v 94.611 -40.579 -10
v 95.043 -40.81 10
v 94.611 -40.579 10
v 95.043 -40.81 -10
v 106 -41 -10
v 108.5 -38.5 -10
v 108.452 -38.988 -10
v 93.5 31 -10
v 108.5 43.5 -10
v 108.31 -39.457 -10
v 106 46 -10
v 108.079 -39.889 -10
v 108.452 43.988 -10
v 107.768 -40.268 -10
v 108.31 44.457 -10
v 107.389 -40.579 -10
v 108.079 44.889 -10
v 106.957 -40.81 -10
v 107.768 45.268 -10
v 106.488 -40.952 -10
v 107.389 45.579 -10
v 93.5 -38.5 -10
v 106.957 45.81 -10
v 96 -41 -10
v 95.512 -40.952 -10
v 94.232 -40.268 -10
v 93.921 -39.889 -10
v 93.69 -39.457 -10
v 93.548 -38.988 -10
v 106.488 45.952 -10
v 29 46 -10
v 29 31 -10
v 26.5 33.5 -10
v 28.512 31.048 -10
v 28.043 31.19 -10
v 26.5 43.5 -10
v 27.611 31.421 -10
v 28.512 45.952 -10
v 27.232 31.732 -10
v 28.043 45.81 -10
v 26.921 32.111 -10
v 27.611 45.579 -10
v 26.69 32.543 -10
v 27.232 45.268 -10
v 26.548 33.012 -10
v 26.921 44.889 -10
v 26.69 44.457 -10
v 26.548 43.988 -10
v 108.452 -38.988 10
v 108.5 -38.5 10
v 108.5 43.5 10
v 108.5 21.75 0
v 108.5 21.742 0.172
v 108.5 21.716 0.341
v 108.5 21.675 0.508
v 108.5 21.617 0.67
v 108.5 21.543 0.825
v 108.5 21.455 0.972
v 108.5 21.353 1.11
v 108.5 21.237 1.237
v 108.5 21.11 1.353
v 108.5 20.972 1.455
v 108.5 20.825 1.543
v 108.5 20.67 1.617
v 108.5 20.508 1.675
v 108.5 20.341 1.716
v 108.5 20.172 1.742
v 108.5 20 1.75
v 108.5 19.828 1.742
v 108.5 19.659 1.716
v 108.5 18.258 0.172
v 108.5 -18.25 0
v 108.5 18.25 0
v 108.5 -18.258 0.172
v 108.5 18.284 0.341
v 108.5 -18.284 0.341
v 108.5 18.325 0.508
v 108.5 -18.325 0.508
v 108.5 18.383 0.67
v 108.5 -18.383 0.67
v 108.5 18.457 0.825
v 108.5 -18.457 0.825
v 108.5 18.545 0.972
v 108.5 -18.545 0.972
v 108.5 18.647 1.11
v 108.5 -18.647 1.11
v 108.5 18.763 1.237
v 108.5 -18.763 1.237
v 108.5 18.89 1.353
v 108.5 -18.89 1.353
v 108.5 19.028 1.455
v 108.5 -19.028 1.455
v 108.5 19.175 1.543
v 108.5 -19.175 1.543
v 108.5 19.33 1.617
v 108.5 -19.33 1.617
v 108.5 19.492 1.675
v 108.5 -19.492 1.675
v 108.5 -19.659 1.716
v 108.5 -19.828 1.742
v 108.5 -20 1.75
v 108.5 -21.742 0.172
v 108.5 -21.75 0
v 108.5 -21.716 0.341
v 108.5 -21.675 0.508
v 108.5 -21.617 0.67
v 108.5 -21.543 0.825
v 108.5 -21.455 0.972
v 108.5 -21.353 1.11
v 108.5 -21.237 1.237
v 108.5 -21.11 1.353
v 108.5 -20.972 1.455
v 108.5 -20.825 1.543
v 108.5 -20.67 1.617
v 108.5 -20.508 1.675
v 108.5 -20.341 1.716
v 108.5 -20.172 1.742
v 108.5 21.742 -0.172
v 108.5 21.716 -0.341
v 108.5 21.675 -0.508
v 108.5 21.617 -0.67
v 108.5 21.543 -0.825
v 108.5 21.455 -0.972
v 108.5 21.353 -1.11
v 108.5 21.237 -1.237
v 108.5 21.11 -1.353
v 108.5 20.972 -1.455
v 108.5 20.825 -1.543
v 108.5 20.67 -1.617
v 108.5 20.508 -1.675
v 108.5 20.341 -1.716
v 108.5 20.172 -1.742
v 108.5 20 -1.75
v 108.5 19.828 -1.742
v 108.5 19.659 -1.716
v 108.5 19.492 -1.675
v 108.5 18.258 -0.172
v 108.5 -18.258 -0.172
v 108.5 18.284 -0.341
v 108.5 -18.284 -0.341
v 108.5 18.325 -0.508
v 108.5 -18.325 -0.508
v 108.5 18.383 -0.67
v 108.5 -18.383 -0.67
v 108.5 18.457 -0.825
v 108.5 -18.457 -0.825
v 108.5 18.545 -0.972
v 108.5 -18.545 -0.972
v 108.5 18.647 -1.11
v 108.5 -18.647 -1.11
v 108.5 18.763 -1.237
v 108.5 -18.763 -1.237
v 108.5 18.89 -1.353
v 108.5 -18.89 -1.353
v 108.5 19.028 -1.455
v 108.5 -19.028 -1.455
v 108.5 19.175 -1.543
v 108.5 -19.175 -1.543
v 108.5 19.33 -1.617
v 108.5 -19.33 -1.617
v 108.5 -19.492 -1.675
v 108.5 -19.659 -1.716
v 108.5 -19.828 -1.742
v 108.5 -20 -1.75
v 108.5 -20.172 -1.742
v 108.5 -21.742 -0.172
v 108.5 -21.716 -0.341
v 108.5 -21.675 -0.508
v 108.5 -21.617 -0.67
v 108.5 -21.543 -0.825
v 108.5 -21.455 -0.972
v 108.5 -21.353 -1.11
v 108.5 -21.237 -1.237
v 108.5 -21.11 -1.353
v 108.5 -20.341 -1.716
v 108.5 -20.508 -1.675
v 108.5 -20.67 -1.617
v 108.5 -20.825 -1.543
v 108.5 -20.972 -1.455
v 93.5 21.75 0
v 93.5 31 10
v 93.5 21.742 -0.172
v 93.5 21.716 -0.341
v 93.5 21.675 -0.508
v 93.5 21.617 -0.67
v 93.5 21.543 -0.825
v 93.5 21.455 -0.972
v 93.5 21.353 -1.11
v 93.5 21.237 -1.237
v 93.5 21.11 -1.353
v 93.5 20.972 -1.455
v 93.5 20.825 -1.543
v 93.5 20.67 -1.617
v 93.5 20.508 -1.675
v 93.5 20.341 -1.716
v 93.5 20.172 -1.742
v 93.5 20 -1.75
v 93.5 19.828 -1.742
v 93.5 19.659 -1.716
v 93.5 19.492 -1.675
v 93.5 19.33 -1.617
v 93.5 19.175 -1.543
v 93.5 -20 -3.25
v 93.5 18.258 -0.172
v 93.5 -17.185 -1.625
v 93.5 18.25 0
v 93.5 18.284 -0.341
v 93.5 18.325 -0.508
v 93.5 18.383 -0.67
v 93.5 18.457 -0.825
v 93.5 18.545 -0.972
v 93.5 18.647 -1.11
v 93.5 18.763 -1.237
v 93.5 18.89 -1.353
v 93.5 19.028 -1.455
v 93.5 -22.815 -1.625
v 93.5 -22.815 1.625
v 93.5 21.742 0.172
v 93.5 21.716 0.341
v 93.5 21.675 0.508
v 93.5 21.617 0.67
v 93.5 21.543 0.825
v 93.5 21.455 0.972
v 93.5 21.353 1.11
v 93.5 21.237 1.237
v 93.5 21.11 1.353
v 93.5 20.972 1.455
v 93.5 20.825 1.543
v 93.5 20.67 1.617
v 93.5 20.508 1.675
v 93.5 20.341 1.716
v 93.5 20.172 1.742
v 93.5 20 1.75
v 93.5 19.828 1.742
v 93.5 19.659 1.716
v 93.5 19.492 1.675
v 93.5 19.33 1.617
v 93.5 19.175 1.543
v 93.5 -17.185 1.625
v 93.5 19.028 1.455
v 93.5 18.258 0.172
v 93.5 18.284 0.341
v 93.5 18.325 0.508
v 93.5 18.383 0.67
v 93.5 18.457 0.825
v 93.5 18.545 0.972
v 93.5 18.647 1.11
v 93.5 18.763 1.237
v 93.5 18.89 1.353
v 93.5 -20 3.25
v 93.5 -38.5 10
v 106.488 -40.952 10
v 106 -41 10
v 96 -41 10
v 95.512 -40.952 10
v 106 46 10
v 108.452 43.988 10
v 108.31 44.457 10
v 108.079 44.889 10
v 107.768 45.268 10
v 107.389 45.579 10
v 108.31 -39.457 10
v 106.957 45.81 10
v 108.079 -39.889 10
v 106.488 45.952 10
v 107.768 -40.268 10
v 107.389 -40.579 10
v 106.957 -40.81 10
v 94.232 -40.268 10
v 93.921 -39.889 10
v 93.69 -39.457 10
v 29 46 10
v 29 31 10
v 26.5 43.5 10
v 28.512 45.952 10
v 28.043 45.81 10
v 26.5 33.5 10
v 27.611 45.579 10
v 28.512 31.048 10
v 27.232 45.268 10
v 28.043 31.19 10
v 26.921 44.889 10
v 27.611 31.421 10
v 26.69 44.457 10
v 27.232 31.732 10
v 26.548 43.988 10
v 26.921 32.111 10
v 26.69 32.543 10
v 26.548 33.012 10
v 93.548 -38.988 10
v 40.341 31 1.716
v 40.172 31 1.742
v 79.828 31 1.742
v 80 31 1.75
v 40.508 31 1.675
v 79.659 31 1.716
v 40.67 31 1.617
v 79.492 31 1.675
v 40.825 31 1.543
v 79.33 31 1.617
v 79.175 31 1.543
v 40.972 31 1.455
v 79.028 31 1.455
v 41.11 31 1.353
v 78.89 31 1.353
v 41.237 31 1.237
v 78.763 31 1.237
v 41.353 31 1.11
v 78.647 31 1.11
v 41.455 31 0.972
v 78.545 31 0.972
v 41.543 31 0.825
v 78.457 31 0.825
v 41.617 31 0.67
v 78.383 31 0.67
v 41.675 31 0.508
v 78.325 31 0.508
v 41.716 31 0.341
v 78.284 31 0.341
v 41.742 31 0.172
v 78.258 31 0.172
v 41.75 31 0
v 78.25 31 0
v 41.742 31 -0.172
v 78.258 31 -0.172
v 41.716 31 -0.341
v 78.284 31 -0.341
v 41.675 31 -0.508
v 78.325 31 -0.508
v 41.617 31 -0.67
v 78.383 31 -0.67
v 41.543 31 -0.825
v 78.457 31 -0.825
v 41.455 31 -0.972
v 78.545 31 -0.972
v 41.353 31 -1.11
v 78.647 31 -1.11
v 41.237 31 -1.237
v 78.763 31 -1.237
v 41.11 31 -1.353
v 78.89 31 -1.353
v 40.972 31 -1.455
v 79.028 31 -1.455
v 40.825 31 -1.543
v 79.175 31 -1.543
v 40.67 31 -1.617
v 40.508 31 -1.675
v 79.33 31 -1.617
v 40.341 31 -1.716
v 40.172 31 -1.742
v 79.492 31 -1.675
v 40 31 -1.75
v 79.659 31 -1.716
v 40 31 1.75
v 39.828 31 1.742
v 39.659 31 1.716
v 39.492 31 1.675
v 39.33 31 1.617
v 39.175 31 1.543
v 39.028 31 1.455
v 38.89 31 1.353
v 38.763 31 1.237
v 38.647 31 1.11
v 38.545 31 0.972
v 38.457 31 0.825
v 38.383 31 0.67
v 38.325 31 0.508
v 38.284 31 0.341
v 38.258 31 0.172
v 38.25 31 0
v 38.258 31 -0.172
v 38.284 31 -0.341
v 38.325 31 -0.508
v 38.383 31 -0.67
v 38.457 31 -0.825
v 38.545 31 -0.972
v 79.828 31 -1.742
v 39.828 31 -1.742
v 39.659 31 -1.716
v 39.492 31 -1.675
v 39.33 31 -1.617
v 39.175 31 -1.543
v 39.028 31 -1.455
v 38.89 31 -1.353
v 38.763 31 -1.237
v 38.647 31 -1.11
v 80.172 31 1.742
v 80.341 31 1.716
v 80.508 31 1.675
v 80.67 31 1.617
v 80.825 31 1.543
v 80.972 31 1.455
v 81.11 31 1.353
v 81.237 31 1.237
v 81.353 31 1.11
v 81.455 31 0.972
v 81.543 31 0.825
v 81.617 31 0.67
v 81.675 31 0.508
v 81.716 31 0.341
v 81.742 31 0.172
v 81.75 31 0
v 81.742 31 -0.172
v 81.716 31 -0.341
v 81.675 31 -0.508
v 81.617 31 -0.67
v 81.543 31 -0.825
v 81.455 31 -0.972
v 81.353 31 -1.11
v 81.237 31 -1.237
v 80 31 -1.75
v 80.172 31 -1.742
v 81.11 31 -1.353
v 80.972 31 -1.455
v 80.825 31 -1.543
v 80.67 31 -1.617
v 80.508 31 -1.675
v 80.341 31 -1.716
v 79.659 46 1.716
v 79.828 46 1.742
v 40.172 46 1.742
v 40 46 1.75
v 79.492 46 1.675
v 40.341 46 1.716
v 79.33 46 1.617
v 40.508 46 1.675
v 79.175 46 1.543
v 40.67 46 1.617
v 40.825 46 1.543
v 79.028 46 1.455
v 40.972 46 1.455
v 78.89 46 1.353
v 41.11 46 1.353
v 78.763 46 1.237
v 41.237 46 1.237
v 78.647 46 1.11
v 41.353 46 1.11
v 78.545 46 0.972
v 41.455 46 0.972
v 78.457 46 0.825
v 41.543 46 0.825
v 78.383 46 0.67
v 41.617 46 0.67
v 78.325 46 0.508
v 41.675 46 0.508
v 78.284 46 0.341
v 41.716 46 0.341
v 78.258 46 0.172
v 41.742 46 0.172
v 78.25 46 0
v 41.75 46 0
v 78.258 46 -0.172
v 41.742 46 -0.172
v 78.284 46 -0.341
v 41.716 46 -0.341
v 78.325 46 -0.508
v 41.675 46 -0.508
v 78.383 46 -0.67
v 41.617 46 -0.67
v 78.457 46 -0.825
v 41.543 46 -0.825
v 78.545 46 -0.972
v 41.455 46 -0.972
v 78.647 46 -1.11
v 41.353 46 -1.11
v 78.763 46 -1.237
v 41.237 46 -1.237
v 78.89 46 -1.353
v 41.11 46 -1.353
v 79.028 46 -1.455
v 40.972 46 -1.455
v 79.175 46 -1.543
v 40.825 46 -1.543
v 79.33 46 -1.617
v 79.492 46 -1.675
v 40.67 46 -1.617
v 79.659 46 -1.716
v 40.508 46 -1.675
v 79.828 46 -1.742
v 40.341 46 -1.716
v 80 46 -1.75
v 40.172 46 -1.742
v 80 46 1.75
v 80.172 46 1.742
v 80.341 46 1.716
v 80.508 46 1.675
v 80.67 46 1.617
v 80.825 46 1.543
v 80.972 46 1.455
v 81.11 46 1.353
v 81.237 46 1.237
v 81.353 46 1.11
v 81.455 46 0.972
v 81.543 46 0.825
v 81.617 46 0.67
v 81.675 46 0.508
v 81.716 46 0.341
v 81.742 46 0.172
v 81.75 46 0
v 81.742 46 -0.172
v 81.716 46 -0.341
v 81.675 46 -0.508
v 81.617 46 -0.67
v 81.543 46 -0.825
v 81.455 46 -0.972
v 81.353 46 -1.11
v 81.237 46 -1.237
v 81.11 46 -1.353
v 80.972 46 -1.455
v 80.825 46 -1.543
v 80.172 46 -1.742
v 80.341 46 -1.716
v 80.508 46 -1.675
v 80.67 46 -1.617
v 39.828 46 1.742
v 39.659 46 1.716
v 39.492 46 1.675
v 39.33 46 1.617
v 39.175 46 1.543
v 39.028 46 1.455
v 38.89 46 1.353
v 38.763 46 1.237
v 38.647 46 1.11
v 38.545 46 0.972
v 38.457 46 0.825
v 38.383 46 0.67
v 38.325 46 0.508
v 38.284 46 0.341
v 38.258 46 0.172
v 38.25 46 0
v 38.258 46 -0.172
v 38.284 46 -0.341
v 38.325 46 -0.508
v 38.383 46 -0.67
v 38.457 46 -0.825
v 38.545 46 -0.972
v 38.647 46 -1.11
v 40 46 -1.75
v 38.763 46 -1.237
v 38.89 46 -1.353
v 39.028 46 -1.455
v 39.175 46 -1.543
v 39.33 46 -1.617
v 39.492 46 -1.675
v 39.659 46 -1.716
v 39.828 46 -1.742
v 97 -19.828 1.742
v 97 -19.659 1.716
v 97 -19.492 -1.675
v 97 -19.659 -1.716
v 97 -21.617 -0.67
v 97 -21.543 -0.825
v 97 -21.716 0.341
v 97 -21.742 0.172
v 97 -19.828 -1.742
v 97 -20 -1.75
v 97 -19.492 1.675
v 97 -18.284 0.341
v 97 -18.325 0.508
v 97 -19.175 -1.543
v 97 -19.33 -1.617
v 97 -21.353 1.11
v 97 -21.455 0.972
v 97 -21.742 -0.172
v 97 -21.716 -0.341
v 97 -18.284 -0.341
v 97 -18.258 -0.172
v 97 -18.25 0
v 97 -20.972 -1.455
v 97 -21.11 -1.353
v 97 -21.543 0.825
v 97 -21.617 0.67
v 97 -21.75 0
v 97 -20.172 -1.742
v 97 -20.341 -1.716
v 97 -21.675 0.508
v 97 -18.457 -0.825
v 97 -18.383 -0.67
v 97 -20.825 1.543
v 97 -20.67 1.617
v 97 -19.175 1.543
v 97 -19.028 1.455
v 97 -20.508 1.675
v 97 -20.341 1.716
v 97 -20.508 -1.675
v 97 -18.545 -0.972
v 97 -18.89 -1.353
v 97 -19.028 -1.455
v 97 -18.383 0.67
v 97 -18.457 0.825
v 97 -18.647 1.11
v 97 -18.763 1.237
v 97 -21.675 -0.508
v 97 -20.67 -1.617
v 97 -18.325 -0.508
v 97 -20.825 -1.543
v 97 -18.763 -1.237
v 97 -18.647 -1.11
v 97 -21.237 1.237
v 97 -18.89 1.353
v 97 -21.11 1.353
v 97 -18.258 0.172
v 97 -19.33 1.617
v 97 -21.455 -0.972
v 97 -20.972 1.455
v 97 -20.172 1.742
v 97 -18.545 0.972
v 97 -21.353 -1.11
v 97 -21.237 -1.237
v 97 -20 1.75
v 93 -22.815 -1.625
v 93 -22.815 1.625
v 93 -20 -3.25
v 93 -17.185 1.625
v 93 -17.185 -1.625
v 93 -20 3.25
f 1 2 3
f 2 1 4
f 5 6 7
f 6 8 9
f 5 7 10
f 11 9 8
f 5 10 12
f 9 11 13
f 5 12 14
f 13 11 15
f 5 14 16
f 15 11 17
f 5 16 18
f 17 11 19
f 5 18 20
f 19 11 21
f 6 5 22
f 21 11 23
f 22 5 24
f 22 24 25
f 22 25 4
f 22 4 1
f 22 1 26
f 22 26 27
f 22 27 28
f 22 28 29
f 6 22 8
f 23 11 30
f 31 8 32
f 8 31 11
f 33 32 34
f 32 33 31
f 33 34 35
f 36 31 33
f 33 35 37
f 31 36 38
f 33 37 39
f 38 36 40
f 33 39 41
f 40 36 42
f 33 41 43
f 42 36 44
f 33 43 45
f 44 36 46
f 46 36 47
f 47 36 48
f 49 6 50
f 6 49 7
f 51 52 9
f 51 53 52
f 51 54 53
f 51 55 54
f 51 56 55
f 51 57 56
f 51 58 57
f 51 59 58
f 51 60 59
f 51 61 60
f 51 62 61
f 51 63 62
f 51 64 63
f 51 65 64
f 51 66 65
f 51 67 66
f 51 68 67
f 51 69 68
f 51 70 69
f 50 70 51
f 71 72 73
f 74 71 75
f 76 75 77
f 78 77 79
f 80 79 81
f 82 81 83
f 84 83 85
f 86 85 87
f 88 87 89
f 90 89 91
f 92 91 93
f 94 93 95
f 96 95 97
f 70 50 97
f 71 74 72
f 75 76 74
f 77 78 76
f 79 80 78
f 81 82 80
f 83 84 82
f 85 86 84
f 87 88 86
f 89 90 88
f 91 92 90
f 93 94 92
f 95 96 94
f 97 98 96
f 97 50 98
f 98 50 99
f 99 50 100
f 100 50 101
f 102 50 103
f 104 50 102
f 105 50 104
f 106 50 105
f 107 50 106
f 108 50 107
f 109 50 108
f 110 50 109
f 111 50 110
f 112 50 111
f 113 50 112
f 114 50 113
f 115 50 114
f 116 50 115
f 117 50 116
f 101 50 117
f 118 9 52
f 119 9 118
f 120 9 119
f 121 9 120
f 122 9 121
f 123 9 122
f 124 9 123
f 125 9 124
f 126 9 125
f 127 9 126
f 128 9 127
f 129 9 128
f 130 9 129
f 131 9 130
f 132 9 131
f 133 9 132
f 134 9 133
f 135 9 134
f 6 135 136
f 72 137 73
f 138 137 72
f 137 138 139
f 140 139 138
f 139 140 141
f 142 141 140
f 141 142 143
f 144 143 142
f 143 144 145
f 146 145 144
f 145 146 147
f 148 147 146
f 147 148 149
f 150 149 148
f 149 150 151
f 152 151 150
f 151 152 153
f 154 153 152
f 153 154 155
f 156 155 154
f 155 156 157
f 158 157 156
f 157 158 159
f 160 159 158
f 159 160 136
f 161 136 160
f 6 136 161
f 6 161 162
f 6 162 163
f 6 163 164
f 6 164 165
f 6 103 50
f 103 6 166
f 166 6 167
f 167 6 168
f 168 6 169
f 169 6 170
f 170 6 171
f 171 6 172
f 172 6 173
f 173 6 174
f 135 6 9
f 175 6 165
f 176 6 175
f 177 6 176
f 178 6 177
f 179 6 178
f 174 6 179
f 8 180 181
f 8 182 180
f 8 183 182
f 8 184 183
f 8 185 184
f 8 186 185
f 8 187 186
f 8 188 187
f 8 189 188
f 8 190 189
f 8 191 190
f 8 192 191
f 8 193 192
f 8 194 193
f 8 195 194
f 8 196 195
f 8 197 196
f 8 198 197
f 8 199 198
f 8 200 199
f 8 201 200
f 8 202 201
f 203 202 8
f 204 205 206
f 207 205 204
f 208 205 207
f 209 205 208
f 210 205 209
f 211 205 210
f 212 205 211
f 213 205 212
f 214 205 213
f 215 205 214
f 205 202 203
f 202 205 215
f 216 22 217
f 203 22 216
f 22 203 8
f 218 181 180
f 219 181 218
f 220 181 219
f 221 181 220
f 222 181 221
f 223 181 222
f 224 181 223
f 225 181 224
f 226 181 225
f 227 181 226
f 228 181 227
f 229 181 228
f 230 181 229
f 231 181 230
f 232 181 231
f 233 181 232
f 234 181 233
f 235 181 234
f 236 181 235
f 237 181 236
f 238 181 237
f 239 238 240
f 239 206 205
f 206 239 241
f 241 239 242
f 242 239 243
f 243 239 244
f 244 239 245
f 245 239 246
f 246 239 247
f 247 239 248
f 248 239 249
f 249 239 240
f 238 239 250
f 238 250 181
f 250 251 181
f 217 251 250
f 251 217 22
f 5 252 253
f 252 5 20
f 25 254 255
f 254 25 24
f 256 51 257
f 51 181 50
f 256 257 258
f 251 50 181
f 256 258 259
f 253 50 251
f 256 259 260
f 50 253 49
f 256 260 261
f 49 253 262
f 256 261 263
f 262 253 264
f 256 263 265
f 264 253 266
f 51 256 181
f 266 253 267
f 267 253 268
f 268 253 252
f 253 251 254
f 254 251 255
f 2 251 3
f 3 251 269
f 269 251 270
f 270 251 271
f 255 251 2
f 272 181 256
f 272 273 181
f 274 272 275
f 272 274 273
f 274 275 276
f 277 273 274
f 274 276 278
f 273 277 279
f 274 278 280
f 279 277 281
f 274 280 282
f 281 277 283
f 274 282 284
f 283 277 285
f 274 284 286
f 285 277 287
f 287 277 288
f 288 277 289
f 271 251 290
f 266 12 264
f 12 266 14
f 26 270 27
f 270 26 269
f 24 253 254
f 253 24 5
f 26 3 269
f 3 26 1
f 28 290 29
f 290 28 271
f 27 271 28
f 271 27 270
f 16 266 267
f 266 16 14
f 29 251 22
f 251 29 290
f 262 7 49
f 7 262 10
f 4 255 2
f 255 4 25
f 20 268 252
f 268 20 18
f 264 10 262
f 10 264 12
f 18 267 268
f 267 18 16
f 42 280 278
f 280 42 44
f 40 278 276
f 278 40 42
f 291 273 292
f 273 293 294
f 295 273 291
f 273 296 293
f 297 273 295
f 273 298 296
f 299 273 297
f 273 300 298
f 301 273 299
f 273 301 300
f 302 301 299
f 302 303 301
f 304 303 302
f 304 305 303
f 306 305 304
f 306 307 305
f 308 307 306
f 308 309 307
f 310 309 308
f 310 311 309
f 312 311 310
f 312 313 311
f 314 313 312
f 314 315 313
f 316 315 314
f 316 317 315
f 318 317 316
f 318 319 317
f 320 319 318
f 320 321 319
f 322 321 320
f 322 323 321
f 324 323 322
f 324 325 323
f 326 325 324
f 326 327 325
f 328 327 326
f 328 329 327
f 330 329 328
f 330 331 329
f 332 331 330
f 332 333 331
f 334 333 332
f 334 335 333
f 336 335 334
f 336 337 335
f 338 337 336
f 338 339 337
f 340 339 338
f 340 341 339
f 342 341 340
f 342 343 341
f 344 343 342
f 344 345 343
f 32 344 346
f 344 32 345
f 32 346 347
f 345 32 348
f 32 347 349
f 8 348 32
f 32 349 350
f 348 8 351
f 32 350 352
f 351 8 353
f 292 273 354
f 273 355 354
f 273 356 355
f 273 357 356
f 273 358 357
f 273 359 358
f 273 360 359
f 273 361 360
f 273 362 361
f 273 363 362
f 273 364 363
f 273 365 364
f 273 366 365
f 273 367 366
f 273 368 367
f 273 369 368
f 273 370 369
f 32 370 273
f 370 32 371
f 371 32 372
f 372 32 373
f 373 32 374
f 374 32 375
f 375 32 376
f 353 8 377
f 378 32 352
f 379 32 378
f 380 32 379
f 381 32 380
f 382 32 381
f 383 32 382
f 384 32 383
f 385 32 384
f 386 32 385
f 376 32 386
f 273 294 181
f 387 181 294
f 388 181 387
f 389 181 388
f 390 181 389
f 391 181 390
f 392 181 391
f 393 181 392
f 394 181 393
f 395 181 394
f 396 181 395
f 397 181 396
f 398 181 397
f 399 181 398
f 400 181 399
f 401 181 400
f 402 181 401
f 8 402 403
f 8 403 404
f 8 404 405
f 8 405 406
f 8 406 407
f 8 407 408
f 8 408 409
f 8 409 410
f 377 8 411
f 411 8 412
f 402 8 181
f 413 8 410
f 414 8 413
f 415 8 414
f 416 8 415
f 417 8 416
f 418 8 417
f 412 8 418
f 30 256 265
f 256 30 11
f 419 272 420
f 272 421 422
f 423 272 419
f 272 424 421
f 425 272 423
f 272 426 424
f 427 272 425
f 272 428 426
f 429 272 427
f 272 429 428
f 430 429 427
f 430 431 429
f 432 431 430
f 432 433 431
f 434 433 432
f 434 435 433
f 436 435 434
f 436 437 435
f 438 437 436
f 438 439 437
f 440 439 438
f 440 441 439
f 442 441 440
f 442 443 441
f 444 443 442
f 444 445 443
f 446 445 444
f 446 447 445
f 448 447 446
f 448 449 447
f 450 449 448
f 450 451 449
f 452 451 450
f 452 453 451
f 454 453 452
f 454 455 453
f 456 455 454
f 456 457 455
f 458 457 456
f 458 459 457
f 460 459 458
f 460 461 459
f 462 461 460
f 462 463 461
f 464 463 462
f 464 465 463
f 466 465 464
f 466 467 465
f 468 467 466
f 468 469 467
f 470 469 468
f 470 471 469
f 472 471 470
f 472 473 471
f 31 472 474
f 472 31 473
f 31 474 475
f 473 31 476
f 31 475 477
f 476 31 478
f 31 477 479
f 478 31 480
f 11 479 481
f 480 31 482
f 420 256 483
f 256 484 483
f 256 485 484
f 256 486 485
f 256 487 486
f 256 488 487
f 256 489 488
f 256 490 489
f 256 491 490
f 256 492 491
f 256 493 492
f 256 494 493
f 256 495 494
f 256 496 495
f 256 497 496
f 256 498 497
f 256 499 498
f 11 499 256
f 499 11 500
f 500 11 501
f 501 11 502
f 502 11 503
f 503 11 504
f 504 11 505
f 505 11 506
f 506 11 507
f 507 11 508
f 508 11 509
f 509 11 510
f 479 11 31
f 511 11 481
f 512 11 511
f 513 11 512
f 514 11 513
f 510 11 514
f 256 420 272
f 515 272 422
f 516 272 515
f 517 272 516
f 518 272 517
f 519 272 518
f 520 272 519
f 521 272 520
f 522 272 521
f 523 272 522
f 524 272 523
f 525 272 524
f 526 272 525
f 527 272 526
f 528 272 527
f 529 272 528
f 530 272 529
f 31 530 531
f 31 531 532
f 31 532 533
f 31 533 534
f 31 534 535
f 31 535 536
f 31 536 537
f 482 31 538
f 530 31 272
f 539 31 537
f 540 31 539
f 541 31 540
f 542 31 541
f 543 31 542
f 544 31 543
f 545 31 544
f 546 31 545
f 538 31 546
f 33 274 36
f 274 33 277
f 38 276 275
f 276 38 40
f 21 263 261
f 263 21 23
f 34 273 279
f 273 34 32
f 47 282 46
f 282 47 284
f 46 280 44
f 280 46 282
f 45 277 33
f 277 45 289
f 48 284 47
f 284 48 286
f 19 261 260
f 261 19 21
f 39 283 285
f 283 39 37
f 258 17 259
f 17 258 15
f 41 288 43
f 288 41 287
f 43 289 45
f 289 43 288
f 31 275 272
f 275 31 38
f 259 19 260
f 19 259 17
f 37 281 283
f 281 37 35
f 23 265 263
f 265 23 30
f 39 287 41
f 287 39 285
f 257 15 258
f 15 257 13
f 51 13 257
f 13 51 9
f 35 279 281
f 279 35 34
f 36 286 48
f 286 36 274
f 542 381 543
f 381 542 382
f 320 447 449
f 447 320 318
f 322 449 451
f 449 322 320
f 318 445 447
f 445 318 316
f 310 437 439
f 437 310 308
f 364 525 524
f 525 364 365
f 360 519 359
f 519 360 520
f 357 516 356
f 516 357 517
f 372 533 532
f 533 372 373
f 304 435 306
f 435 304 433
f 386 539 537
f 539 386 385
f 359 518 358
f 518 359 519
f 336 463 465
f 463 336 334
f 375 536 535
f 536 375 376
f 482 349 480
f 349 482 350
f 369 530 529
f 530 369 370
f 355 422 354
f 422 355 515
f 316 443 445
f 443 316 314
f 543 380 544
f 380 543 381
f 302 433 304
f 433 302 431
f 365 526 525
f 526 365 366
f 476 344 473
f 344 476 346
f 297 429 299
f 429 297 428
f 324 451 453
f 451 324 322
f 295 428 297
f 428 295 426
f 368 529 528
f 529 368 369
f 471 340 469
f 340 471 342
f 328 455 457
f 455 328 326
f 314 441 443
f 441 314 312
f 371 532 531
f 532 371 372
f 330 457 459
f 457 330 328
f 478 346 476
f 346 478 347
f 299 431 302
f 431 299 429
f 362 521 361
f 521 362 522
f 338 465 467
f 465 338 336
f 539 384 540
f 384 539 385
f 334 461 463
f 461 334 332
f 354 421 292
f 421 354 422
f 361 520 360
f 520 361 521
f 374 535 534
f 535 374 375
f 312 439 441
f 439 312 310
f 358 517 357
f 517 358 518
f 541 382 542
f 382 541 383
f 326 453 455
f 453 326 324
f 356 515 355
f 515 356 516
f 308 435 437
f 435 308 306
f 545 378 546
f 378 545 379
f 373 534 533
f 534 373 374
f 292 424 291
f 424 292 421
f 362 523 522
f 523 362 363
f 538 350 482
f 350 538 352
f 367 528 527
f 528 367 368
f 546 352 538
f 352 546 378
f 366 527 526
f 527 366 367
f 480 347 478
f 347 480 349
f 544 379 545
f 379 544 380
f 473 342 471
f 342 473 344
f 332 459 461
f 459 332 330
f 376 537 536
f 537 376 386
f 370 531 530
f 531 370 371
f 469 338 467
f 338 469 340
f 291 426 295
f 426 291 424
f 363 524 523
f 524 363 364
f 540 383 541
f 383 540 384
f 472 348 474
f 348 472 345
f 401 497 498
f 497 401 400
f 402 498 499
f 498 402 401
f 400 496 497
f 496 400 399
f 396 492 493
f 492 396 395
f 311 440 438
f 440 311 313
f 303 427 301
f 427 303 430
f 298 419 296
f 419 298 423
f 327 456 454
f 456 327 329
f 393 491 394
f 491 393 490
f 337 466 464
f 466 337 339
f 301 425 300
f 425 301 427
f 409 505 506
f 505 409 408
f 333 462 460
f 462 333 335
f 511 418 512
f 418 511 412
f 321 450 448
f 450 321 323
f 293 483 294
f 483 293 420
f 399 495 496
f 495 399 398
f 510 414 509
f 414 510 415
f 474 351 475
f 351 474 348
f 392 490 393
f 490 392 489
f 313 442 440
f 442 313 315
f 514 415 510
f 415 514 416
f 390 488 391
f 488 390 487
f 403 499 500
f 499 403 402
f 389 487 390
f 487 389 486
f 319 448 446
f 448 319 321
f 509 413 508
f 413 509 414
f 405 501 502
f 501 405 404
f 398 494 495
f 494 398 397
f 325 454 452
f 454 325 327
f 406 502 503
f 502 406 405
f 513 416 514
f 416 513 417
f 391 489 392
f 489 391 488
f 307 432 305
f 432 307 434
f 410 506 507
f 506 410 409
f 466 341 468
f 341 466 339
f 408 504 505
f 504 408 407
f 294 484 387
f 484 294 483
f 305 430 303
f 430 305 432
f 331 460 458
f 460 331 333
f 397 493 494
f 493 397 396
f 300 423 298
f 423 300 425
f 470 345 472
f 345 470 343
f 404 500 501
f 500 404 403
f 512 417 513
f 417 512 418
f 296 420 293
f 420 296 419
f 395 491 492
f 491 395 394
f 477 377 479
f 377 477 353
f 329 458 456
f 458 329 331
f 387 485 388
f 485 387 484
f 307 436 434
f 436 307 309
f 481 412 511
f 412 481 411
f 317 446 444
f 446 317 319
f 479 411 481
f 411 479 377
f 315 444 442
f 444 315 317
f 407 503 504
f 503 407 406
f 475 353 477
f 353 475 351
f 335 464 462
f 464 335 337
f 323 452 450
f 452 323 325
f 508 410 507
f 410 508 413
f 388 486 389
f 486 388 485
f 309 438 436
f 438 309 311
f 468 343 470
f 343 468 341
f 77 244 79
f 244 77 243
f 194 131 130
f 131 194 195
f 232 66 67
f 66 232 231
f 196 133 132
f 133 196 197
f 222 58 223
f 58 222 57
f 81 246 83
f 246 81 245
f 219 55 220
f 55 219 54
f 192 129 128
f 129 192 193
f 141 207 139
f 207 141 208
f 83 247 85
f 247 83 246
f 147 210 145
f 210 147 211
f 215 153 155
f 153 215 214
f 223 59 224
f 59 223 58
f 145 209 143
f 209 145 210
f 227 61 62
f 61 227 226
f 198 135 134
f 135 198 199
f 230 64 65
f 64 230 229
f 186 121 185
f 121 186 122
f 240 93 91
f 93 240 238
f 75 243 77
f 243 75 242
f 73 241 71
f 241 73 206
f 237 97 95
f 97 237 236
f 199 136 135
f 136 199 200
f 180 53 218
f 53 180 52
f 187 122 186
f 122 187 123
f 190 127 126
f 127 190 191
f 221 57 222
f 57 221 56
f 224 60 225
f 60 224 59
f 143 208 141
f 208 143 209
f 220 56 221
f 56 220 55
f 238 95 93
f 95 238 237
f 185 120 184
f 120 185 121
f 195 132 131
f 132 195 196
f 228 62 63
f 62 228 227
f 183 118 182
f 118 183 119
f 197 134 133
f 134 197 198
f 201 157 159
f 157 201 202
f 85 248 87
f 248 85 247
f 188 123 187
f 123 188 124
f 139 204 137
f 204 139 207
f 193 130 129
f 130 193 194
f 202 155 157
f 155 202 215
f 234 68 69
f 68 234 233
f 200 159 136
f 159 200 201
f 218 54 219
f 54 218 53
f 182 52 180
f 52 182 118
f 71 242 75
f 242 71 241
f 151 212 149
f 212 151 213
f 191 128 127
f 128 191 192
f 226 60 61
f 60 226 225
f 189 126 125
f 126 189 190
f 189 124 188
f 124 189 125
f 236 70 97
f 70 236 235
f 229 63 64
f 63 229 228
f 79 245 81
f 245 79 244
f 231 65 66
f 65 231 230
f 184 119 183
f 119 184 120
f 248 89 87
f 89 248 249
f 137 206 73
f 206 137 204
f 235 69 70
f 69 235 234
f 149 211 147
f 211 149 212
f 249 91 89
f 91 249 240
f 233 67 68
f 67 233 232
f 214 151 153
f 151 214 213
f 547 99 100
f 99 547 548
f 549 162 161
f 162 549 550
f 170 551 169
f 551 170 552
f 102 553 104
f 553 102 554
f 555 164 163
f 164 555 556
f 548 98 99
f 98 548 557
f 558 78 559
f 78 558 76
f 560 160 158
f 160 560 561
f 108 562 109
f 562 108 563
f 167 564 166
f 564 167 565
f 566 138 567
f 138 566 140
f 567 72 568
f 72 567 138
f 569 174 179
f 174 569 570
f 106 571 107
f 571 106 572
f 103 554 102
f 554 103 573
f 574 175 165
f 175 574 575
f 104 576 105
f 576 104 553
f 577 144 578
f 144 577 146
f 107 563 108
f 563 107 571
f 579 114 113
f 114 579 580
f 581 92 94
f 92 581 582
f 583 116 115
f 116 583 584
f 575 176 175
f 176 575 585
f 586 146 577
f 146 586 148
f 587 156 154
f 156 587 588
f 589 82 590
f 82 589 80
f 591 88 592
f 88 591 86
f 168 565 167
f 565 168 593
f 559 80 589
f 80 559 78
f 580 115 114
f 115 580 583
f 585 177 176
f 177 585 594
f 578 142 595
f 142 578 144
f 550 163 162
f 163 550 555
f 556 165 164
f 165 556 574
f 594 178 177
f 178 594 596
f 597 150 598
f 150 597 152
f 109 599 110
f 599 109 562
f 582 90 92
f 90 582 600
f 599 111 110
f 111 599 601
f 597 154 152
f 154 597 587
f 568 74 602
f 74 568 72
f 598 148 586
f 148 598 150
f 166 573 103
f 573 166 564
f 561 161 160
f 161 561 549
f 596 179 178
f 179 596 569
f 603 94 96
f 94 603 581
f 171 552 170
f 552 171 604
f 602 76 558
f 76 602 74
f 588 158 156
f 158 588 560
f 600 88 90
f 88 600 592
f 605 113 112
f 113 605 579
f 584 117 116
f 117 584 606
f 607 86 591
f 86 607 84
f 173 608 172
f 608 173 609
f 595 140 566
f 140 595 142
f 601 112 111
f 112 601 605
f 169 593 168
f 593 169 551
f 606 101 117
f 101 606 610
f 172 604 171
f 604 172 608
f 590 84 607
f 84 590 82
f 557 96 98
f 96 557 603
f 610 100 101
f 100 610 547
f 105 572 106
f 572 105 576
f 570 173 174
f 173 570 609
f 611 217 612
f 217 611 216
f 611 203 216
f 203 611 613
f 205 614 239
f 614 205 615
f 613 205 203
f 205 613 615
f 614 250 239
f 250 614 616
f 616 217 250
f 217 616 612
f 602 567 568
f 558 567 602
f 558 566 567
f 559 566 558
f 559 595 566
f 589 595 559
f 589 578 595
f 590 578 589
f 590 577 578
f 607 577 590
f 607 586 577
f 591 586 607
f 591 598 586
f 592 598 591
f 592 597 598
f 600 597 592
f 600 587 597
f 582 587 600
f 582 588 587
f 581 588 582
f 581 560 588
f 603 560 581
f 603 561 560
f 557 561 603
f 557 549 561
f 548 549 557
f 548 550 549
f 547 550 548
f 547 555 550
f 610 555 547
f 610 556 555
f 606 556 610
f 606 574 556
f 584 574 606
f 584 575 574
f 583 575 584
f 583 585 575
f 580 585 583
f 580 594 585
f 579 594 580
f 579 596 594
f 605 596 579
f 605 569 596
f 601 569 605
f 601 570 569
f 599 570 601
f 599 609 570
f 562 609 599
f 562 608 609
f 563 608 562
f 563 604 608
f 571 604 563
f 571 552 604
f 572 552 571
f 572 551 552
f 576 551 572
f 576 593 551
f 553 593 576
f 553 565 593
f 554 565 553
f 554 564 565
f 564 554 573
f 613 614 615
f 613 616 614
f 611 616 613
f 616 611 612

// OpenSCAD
// file: ocular.scad
ocular();
module top(){
    difference(){
        cylinder(d=30, h=5, center=true);
        cylinder(d=23-0.5-3, h=15, center=true);
    }
}
module ocular(){
    translate([0,0,35/2+5/2])
    top();
    difference(){
        cylinder(d=23-0.5, h = 35, center = true);
        cylinder(d=23-0.5-3, h = 40, center = true);
    }
}
// file: smartphone.scad
echo("Работа Горбуновой Арины!");
$fn = 128;
r_round_corner = 15;

//color("green")
//translate([0,0,15])
//cube([150,75.2,9],center=true);

smartphone();

module smartphone(){
    hull(){
        color("red")
        translate([150/2 - r_round_corner/2,75/2 - r_round_corner/2,0])
        cylinder(d=r_round_corner, h=9,center=true);
        
        mirror([1,0,0])
        color("red")
        translate([150/2 - r_round_corner/2,75/2 - r_round_corner/2,0])
        cylinder(d=r_round_corner, h=9,center=true);
        
        mirror([0,1,0])
        color("red")
        translate([150/2 - r_round_corner/2,75/2 - r_round_corner/2,0])
        cylinder(d=r_round_corner, h=9,center=true);
        
        mirror([1,0,0])
        mirror([0,1,0])
        color("red")
        translate([150/2 - r_round_corner/2,75/2 - r_round_corner/2,0])
        cylinder(d=r_round_corner, h=9,center=true);
    }
}

//ocular();
//translate([0,0,35/2+5/2])
//top();

module top(){
    difference(){
        cylinder(d=30, h=5, center=true);
        cylinder(d=23-0.5-3, h=15, center=true);
    }
}
module ocular(){
    difference(){
        cylinder(d=23-0.5, h = 35, center = true);
        cylinder(d=23-0.5-3, h = 40, center = true);
    }
}
// main file
use <smartphone.scad>
use <ocular.scad>

phone_height = 162;
phone_width = 77;




//translate([phone_height/2-23/2-19,phone_width/2-23/2-2,35/2+15])
//rotate([180,0,0])
//ocular();
//frame1();
//translate([0,25,3])
//color("red")
//corner(thickness=20);

difference(){
    color("red")
    corner(thickness=20);
    
    holes_corner();
}

translate([95,-20,0])
rotate([0,90,0])
nut_m3();

module nut_m3(){
    cylinder(d=6+0.5,h=4,center=true, $fn=6);
    cylinder(d=6+0.5,h=1,center=true, $fn=64);
}

module holes_corner(){
    translate([40,40,0.])
    rotate([90,0,0])
    cylinder(d=3.5,h=25, center = true, $fn=64);
    
    translate([80,40,0.])
    rotate([90,0,0])
    cylinder(d=3.5,h=25, center = true, $fn=64);
    
    translate([100,20,0.])
    rotate([0,90,0])
    cylinder(d=3.5,h=25, center = true, $fn=64);
    
    translate([100,-20,0.])
    rotate([0,90,0])
    cylinder(d=3.5,h=25, center = true, $fn=64);
}
//difference(){
//    translate([phone_height/2-14, 22.5, 11.5])
//    cube([phone_height/2,phone_width, 3],center=true);
//    translate([phone_height/2-23/2-19,phone_width/2-23/2-2,35/2])
//    cylinder(d=23-0.5-3,h=40,center=true);
//}
module frame1(){
    difference(){
        color("green")
        translate([phone_height/2-phone_height/4+10,10,0])
        cube([phone_height/2,phone_width+10, 10], center=true);
        scale([1,1,2])
        block();
    }
}



module corner(thickness){
    translate([phone_height/2+20,0,0])
    frame2(thickness);
    
    translate([phone_height/2 - 13.5, phone_width/2,0])
    rotate([0,0,90])
    frame2(thickness);

}
module frame2(thickness){
    hull(){
        translate([5,phone_width/2,0])
        cylinder(d=5, h=thickness,center=true,$fn=32);
        
        mirror([1,0,0])
        translate([5,phone_width/2,0])
        cylinder(d=5, h=thickness,center=true,$fn=32);
        
        mirror([0,1,0])
        translate([5,phone_width/2,0])
        cylinder(d=5, h=thickness,center=true,$fn=32);
        
        mirror([1,0,0])
        mirror([0,1,0])
        translate([5,phone_width/2,0])
        cylinder(d=5, h=thickness,center=true,$fn=32);
    }
}
